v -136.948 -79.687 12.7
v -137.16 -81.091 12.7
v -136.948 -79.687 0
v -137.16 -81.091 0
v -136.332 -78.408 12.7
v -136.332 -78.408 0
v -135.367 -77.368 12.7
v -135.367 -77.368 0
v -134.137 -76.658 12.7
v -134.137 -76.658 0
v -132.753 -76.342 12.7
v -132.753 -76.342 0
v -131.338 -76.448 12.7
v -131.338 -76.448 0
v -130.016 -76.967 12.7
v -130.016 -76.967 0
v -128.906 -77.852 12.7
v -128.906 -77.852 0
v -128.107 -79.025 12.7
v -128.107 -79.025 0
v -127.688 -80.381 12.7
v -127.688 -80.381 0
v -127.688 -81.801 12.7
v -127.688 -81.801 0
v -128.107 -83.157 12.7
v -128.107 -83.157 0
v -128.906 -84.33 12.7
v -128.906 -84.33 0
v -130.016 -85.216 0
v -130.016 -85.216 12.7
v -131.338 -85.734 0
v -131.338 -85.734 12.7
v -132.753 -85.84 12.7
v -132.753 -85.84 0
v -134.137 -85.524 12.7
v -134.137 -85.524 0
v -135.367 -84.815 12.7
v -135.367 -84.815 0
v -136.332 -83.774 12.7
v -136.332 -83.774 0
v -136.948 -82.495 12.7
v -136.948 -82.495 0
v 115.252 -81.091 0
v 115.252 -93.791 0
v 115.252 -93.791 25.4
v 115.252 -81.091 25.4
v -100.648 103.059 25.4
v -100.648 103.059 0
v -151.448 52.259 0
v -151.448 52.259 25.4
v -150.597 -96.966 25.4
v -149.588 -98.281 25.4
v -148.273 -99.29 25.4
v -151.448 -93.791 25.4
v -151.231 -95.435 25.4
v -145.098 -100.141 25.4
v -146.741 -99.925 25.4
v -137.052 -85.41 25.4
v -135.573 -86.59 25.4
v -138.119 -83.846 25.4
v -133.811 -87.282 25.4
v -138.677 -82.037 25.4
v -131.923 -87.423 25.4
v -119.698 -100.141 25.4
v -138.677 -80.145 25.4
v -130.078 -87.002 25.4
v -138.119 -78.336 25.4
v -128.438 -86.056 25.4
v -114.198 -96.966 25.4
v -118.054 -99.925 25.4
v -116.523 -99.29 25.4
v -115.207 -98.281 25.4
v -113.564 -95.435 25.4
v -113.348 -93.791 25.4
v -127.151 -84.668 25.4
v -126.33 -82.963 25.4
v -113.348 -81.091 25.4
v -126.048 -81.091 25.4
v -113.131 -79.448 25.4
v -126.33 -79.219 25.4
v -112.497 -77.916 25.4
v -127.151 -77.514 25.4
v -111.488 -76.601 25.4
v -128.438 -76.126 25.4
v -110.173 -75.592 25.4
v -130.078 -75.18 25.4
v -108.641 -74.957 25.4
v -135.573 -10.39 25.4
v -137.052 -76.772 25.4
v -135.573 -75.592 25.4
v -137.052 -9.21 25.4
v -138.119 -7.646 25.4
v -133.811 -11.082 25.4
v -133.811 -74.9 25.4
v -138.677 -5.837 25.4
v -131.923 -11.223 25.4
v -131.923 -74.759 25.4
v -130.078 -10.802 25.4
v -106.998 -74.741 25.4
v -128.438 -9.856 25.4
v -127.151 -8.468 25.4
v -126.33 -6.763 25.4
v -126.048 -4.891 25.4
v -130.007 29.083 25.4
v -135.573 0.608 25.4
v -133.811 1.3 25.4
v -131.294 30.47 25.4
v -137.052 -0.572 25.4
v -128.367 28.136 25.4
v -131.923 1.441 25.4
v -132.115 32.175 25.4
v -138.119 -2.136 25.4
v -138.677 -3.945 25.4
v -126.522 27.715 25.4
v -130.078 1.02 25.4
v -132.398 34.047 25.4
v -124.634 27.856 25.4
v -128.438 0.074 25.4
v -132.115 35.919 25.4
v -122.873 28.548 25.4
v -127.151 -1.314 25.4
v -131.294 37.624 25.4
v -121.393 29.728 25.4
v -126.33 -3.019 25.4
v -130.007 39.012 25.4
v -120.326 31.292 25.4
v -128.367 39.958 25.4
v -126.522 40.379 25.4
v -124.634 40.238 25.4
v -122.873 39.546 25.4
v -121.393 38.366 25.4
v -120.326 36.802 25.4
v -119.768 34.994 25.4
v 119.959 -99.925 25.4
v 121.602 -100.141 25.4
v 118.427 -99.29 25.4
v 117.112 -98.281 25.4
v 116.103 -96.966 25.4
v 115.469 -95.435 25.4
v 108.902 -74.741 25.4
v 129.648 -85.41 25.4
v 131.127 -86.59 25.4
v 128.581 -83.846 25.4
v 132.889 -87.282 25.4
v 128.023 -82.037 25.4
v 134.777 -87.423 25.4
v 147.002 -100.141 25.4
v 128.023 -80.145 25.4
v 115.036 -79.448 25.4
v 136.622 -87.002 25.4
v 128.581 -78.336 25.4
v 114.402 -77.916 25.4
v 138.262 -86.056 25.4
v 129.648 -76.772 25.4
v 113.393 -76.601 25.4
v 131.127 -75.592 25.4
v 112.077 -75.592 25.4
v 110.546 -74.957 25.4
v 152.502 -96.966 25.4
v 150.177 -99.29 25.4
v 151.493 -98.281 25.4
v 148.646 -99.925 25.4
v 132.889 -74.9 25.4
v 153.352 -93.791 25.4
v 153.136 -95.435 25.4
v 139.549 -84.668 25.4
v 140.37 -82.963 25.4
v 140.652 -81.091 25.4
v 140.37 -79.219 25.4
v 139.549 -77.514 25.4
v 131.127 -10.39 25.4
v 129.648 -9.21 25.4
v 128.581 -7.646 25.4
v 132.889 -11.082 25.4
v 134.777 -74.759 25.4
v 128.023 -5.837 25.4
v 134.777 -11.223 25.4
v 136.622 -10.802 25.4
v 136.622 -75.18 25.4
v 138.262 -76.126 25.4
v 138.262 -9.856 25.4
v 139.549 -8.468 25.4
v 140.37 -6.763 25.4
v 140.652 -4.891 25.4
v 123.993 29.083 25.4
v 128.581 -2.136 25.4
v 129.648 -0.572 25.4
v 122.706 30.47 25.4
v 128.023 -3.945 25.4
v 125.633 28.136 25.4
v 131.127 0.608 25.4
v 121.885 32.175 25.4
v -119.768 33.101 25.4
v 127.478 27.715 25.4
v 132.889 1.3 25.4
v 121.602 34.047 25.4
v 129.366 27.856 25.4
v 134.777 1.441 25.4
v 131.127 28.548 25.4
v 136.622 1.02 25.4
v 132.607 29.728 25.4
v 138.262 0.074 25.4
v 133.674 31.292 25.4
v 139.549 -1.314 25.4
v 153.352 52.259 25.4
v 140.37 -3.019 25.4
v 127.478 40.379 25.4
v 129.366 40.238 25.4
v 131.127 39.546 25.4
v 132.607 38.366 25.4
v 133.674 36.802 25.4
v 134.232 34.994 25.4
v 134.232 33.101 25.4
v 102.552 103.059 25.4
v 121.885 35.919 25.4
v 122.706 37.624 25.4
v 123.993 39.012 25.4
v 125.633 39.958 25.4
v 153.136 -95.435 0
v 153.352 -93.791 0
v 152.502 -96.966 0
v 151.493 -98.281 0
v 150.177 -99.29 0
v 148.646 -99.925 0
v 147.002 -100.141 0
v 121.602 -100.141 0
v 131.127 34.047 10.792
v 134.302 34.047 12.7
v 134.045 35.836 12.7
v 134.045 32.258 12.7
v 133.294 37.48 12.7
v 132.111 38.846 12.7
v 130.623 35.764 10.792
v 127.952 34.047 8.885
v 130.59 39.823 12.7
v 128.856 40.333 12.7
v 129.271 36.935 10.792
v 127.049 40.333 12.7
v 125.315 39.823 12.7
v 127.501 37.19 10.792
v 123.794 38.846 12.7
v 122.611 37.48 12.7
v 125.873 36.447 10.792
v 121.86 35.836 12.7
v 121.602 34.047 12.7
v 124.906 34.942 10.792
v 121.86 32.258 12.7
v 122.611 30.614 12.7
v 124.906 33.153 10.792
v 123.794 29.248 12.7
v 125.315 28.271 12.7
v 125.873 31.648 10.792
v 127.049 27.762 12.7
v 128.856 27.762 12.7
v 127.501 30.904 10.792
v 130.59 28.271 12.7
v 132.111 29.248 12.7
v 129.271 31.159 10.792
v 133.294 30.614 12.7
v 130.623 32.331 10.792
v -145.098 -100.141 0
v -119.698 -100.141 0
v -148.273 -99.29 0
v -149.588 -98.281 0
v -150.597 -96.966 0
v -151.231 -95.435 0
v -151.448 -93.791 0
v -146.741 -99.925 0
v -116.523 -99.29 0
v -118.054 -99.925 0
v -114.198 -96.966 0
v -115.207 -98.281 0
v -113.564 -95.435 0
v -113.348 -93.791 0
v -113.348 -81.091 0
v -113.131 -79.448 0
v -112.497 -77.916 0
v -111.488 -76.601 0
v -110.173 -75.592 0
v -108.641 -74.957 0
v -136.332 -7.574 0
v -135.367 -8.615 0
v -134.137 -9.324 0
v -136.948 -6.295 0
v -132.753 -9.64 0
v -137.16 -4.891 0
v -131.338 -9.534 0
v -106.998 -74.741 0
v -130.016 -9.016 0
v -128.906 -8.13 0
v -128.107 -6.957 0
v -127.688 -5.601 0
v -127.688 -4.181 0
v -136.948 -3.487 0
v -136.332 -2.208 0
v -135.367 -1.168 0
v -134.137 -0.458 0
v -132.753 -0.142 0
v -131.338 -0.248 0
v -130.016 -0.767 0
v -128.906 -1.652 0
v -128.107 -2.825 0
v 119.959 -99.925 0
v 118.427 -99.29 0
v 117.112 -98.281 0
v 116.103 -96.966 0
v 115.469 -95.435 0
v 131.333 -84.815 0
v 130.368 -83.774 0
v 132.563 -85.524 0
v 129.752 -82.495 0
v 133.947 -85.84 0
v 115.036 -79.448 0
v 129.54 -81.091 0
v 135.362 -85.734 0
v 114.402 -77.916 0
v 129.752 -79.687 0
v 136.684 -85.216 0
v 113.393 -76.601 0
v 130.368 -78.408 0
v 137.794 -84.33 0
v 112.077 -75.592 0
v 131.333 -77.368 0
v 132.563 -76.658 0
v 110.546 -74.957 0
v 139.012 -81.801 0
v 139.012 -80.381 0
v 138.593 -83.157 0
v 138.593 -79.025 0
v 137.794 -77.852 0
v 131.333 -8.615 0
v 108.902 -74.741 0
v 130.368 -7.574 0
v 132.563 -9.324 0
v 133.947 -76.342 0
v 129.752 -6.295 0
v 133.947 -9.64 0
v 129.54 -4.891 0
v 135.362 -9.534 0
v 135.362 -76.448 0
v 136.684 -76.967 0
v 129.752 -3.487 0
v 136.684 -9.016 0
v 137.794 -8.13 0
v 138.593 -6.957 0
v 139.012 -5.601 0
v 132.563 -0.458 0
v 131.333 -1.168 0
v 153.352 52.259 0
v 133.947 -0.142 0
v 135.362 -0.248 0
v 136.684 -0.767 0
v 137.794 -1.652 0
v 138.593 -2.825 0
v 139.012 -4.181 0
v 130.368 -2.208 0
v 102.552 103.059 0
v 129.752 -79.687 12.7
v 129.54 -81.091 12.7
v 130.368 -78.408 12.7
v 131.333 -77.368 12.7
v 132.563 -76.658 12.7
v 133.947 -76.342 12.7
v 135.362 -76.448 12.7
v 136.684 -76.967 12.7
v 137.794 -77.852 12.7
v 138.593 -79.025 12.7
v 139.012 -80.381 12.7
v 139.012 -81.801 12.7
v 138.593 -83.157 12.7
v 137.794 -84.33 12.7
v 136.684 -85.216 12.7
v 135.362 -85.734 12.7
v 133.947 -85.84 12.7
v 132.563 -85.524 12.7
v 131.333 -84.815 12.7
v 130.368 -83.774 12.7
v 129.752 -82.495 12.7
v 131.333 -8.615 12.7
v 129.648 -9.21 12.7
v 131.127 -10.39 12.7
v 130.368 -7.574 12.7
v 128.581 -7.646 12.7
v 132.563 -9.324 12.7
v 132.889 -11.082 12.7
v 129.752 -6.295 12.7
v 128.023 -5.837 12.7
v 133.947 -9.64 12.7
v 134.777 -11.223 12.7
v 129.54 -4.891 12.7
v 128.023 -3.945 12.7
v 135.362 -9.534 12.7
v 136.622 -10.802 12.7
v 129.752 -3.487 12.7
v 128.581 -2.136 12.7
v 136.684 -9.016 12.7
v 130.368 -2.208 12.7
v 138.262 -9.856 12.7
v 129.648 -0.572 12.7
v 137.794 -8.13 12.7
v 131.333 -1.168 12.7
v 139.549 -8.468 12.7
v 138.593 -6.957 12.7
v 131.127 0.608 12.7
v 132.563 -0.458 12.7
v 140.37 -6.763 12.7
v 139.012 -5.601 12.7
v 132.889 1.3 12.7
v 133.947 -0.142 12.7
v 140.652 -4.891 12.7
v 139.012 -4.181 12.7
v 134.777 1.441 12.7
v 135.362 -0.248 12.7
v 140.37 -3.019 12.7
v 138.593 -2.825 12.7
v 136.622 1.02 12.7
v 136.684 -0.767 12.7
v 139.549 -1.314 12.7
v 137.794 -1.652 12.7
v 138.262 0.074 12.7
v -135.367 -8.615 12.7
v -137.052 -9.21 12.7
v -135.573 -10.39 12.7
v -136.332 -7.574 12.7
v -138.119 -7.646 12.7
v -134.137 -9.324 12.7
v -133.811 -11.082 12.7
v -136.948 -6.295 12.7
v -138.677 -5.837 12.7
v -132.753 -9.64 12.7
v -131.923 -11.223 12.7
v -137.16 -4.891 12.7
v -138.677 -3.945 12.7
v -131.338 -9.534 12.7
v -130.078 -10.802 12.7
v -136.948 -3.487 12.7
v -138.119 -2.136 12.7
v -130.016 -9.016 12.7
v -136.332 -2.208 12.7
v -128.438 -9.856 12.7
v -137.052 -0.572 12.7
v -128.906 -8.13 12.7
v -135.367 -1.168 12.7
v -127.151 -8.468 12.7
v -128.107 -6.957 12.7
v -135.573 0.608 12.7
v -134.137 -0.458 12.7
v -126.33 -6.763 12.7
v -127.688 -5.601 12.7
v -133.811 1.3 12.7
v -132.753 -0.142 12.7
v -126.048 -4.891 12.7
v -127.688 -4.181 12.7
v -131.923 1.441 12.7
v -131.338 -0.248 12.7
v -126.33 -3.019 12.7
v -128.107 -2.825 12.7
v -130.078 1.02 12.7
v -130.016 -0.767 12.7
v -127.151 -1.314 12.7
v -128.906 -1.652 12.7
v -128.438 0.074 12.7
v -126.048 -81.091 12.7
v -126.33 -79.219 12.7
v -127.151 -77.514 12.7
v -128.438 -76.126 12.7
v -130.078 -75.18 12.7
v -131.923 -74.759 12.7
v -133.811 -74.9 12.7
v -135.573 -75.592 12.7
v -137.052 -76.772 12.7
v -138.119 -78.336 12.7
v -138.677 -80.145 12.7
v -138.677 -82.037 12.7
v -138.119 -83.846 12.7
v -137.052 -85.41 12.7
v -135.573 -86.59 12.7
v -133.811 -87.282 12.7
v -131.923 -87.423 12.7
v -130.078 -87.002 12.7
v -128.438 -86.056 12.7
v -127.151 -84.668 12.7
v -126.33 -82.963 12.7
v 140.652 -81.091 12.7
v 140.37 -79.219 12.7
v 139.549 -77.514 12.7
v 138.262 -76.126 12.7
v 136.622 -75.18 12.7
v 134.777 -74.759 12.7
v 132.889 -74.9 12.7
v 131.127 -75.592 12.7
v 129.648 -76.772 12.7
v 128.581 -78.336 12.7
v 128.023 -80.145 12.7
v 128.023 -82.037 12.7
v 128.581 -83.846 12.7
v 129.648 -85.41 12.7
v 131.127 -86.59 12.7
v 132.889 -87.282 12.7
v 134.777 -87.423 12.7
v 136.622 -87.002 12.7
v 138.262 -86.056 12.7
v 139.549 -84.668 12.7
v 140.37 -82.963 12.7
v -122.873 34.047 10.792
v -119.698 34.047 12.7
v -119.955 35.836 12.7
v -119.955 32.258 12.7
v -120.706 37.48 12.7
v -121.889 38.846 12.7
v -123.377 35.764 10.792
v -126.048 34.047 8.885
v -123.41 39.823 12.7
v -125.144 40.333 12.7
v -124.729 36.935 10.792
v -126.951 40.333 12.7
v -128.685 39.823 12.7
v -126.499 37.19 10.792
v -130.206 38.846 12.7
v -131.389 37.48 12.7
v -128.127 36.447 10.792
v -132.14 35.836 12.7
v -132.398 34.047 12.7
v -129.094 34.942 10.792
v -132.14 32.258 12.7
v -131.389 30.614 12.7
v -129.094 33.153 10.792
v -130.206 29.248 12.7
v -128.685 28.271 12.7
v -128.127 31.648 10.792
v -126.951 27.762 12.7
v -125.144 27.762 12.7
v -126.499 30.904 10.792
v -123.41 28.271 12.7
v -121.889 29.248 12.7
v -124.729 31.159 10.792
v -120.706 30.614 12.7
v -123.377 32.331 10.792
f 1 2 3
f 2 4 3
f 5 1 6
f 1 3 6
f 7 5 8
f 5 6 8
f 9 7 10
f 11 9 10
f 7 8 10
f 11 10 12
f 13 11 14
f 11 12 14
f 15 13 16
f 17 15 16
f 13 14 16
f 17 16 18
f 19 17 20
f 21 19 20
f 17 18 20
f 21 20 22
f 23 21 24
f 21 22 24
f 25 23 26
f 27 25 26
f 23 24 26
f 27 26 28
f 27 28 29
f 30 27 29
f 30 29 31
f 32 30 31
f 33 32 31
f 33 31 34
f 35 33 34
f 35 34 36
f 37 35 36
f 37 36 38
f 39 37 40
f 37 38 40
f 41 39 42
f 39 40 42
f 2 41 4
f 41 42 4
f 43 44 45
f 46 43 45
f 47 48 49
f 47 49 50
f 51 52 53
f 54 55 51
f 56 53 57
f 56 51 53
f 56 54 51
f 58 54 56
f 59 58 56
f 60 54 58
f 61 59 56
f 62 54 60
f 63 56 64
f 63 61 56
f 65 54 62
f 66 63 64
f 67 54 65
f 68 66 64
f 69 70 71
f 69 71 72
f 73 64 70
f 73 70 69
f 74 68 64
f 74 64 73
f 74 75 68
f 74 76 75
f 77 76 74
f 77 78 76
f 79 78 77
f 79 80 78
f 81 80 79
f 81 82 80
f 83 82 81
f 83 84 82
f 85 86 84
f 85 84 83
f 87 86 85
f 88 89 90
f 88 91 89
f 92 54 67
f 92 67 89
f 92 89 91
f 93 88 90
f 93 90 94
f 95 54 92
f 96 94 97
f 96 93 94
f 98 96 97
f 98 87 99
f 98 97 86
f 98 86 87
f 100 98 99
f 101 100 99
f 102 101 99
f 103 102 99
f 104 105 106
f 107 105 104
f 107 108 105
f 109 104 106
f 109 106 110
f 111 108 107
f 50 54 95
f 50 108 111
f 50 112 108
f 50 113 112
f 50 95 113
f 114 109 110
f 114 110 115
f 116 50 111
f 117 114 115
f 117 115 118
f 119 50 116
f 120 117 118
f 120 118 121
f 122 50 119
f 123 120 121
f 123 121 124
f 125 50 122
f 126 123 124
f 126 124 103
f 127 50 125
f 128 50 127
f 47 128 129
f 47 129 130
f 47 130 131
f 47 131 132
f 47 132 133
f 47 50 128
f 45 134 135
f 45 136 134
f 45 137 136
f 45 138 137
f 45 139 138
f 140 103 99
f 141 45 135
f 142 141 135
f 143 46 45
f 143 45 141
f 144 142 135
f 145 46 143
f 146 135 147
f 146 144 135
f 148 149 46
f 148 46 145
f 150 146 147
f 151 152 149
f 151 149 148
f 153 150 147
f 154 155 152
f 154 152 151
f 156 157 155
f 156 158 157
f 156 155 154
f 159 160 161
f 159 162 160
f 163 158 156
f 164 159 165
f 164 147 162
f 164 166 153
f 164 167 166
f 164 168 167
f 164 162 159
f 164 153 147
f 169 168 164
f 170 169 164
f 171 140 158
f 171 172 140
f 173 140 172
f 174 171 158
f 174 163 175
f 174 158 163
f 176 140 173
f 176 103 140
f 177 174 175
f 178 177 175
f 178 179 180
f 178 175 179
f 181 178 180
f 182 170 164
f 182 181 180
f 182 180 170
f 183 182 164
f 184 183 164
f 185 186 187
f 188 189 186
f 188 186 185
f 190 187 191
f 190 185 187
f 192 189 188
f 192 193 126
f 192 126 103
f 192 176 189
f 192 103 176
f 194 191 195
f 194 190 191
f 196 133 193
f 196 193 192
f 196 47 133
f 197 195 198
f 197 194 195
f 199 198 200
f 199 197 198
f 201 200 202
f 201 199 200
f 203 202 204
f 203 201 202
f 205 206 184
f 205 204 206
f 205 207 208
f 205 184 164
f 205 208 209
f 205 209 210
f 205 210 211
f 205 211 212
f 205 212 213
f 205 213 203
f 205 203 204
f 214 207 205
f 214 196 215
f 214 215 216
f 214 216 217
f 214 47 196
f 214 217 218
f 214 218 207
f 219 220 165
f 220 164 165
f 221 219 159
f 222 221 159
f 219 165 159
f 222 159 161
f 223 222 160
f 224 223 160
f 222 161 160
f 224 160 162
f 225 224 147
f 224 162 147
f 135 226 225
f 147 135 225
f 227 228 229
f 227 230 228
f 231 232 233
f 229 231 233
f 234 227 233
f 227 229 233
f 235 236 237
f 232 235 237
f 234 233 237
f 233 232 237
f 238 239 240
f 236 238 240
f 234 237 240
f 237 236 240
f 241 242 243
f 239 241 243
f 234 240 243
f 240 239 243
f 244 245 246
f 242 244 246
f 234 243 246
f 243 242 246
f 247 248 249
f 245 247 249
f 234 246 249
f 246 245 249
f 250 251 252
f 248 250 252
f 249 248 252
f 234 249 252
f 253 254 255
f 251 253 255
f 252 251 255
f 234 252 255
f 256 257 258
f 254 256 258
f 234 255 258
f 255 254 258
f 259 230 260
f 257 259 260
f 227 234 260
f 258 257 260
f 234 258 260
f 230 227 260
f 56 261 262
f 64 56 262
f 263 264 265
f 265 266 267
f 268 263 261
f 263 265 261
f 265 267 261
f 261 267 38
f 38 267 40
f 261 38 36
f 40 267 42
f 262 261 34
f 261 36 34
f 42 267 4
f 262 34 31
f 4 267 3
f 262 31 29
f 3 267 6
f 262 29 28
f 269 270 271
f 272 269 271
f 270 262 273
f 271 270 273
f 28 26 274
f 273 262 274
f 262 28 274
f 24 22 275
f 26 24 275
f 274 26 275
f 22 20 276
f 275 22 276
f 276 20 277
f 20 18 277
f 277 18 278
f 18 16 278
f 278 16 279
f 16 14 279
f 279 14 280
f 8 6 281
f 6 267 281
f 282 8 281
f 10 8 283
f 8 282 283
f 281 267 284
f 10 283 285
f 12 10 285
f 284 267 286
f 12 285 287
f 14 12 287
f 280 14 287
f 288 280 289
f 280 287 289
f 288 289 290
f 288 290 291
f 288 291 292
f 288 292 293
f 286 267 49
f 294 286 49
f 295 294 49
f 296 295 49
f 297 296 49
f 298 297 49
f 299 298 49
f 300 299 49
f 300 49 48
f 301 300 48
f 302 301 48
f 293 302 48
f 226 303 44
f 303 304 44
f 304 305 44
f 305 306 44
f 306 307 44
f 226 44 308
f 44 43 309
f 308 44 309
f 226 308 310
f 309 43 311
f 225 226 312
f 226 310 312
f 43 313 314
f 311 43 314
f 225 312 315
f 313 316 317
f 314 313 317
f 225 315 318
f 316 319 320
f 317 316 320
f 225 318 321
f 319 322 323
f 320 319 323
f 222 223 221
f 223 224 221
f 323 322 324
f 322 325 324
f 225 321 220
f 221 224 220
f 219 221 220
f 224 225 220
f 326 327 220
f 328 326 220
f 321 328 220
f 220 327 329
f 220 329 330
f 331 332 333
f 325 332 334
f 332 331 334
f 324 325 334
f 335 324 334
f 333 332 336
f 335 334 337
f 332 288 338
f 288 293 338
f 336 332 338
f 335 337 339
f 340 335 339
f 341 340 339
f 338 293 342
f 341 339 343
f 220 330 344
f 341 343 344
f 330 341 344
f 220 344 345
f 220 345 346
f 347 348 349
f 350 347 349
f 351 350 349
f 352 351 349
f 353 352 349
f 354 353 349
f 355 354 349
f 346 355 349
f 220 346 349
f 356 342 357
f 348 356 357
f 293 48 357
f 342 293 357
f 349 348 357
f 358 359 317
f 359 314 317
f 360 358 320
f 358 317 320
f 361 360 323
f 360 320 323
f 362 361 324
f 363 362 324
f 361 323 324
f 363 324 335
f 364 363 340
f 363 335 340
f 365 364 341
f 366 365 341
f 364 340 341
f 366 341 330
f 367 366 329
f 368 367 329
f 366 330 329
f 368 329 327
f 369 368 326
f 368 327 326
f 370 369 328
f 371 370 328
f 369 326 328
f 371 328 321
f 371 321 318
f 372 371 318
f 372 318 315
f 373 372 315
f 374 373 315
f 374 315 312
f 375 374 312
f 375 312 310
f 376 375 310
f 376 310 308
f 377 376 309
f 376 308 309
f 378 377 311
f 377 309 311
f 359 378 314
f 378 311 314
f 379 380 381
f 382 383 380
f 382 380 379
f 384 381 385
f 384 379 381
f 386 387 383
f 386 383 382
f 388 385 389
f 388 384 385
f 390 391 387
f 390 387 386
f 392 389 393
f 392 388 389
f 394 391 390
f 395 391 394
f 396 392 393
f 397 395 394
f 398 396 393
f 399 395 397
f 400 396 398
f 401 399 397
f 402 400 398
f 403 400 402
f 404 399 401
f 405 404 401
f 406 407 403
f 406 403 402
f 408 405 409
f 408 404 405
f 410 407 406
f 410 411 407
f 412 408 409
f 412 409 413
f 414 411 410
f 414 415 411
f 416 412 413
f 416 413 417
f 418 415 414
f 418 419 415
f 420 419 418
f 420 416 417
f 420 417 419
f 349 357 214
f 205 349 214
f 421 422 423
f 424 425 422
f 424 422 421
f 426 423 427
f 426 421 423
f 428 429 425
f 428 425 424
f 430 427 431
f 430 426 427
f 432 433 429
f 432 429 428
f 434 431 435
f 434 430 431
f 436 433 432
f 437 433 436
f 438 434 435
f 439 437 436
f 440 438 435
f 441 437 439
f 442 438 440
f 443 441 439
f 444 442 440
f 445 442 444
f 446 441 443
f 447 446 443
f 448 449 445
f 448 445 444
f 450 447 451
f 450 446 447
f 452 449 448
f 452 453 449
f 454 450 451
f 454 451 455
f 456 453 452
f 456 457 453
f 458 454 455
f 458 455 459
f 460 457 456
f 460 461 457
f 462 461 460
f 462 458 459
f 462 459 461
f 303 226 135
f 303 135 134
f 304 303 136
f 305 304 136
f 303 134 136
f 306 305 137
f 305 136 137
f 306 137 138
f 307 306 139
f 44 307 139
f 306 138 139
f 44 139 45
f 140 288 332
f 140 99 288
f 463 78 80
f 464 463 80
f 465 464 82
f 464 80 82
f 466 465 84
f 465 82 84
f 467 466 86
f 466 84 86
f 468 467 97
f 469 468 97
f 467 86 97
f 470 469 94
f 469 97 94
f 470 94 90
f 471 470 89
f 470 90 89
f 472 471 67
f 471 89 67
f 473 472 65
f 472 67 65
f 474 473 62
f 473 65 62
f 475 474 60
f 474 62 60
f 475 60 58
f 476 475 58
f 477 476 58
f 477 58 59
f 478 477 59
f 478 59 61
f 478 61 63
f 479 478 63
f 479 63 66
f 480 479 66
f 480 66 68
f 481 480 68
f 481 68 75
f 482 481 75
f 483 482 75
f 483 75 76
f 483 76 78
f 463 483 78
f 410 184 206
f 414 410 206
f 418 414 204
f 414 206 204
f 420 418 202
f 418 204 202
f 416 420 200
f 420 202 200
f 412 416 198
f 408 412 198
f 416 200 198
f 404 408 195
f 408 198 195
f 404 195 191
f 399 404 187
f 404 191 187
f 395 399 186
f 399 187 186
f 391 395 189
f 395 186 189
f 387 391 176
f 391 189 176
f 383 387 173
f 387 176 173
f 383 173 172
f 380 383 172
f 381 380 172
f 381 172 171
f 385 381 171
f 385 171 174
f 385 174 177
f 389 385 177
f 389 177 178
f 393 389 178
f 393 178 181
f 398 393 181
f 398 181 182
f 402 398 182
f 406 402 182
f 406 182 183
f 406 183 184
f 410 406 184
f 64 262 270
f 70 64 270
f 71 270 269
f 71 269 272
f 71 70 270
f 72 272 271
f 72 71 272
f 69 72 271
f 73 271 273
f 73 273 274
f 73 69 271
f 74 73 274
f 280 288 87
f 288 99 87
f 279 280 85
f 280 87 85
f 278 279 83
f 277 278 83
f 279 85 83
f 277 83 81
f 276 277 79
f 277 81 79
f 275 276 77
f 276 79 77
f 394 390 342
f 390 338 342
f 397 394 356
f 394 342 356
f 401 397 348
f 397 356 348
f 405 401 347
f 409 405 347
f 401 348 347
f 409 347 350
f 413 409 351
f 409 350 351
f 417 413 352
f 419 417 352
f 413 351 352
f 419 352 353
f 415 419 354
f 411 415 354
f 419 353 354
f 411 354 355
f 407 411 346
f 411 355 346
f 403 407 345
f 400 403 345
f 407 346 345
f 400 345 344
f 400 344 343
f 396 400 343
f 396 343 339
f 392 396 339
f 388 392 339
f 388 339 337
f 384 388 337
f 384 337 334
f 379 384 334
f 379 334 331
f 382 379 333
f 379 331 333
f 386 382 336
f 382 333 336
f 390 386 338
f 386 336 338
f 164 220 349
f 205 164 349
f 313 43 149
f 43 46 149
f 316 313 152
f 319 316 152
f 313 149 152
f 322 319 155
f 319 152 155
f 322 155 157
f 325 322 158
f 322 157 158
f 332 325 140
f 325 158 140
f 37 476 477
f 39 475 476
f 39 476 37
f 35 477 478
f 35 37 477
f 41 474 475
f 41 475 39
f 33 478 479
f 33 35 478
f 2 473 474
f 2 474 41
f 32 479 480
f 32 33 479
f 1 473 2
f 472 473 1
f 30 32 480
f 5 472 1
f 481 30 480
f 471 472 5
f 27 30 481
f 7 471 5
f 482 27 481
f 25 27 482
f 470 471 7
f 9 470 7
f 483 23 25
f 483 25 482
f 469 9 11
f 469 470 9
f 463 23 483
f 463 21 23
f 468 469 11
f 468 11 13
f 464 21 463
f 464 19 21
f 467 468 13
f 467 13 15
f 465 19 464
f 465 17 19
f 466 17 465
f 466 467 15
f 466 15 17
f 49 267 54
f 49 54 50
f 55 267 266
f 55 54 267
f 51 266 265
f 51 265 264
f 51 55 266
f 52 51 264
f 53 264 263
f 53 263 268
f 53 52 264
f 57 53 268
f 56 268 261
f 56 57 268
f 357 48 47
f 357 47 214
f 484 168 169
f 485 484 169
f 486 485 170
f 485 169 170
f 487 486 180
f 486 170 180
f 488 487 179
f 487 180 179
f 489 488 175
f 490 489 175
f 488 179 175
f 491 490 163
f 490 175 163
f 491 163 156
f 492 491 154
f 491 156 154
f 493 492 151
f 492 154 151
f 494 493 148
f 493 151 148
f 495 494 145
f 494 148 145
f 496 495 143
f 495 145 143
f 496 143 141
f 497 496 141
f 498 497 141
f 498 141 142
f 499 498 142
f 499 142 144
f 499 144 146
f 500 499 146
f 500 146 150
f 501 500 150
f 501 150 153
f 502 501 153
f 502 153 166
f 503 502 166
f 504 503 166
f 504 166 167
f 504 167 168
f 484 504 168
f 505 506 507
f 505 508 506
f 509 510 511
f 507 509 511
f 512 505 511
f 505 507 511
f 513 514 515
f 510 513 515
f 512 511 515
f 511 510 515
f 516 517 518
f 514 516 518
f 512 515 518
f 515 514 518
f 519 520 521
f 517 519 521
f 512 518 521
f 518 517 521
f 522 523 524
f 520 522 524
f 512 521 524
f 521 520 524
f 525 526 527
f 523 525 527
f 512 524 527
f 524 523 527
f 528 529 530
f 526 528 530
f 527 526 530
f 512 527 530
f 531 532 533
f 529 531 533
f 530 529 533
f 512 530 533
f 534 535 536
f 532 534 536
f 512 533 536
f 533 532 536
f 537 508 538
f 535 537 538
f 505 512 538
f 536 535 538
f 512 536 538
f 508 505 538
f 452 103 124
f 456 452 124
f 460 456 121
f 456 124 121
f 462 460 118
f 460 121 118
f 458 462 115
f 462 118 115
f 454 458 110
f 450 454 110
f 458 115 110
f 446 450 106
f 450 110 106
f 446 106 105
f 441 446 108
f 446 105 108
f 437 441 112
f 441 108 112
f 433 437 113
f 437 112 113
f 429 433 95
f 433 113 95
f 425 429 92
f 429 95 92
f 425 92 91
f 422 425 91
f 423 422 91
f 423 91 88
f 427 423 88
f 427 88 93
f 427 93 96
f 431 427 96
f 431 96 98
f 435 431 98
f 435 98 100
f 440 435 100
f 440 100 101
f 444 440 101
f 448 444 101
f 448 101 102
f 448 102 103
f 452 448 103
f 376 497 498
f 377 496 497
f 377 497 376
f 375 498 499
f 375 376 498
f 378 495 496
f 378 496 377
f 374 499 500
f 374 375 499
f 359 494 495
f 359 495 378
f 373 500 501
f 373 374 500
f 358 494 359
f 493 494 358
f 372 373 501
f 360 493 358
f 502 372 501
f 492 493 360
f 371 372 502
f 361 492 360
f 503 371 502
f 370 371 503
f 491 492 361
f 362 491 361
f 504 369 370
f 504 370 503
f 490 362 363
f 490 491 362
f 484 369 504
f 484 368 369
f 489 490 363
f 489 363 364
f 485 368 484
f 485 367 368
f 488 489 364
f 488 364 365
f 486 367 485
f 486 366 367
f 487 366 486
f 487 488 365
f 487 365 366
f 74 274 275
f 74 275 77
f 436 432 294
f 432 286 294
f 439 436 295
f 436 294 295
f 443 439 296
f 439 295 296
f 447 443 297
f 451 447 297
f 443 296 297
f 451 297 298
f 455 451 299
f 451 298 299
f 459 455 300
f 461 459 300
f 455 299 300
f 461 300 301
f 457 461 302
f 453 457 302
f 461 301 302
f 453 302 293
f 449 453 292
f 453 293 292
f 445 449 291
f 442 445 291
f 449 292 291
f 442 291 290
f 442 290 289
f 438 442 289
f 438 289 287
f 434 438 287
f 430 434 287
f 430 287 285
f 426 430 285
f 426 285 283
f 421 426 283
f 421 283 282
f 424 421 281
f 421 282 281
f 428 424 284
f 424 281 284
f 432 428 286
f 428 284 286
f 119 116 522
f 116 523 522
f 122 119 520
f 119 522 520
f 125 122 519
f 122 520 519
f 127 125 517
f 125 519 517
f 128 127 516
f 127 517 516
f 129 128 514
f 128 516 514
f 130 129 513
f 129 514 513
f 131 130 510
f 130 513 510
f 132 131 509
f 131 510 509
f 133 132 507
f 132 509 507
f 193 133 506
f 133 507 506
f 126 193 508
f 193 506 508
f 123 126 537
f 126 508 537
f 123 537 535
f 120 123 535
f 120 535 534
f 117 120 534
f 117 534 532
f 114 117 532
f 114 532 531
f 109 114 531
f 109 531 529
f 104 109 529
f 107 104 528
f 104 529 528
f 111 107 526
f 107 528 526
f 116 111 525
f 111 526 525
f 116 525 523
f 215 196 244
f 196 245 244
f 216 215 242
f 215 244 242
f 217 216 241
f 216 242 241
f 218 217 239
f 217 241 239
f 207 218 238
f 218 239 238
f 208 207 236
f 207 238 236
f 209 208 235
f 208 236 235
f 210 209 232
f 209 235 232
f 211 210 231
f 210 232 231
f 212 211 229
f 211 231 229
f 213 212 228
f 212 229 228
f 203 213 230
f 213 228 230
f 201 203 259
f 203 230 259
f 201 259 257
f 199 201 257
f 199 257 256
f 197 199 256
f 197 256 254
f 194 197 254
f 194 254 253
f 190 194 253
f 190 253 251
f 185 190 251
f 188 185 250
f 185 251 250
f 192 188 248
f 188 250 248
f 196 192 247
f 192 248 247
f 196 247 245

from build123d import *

# Parameters (mm, degrees)
F0_W           = 304.8
F0_H           = 203.2
F1_DEPTH       = 25.4
F3_SIZE        = 50.8
F4_W           = 228.6
F4_H           = 25.4
F5_DEPTH       = 25.4
F6_R           = 6.35
F8_D           = 9.525
F8_CBORE_D     = 12.7
F8_CBORE_DEPTH = 12.7
F10_D          = 12.7
F10_DEPTH      = 12.7
F10_TIP        = 3.8154649308


with BuildPart() as f1:
    # F0 (on Top) → F1 (new body)
    with BuildSketch(Plane.XY):
        with Locations((0.9524989873, 1.4589339421)):
            Rectangle(F0_W, F0_H)
    extrude(amount=F1_DEPTH)

    # F3
    f3_edges = [f1.edges().sort_by_distance(p)[0] for p in [
        (-151.447501, 103.058934, 12.7),
        (153.352499, 103.058934, 12.7),
    ]]
    chamfer(f3_edges, length=F3_SIZE)

    # F4 (on face) → F5 (cut)
    with BuildSketch(Plane.XZ.offset(100.1410660579)):
        with Locations((0.9524989873, 12.7)):
            Rectangle(F4_W, F4_H)
    extrude(amount=-F5_DEPTH, mode=Mode.SUBTRACT)

    # F6
    f6_edges = [f1.edges().sort_by_distance(p)[0] for p in [
        (-113.347501, -100.141066, 12.7),
        (-113.347501, -74.741066, 12.7),
        (115.252499, -74.741066, 12.7),
        (115.252499, -100.141066, 12.7),
        (153.352499, -100.141066, 12.7),
        (-151.447501, -100.141066, 12.7),
    ]]
    fillet(f6_edges, radius=F6_R)

    # F8 (through all)
    with Locations(Plane.XY.offset(25.4)):
        with Locations((-132.3975010127, -81.0910660579), (-132.3975010127, -4.8910660579), (134.3024989873, -4.8910660579), (134.3024989873, -81.0910660579)):
            CounterBoreHole(F8_D / 2, F8_CBORE_D / 2, F8_CBORE_DEPTH)

    # F10
    with Locations(Plane.XY.offset(25.4)):
        with Locations((-126.0475010127, 34.0471339421), (127.9524989873, 34.0471339421)):
            Hole(F10_D / 2, depth=F10_DEPTH)
            with Locations((0, 0, -(F10_DEPTH + F10_TIP / 2))):  # 118° drill point
                Cone(0, F10_D / 2, F10_TIP, mode=Mode.SUBTRACT)


solid = f1.part
